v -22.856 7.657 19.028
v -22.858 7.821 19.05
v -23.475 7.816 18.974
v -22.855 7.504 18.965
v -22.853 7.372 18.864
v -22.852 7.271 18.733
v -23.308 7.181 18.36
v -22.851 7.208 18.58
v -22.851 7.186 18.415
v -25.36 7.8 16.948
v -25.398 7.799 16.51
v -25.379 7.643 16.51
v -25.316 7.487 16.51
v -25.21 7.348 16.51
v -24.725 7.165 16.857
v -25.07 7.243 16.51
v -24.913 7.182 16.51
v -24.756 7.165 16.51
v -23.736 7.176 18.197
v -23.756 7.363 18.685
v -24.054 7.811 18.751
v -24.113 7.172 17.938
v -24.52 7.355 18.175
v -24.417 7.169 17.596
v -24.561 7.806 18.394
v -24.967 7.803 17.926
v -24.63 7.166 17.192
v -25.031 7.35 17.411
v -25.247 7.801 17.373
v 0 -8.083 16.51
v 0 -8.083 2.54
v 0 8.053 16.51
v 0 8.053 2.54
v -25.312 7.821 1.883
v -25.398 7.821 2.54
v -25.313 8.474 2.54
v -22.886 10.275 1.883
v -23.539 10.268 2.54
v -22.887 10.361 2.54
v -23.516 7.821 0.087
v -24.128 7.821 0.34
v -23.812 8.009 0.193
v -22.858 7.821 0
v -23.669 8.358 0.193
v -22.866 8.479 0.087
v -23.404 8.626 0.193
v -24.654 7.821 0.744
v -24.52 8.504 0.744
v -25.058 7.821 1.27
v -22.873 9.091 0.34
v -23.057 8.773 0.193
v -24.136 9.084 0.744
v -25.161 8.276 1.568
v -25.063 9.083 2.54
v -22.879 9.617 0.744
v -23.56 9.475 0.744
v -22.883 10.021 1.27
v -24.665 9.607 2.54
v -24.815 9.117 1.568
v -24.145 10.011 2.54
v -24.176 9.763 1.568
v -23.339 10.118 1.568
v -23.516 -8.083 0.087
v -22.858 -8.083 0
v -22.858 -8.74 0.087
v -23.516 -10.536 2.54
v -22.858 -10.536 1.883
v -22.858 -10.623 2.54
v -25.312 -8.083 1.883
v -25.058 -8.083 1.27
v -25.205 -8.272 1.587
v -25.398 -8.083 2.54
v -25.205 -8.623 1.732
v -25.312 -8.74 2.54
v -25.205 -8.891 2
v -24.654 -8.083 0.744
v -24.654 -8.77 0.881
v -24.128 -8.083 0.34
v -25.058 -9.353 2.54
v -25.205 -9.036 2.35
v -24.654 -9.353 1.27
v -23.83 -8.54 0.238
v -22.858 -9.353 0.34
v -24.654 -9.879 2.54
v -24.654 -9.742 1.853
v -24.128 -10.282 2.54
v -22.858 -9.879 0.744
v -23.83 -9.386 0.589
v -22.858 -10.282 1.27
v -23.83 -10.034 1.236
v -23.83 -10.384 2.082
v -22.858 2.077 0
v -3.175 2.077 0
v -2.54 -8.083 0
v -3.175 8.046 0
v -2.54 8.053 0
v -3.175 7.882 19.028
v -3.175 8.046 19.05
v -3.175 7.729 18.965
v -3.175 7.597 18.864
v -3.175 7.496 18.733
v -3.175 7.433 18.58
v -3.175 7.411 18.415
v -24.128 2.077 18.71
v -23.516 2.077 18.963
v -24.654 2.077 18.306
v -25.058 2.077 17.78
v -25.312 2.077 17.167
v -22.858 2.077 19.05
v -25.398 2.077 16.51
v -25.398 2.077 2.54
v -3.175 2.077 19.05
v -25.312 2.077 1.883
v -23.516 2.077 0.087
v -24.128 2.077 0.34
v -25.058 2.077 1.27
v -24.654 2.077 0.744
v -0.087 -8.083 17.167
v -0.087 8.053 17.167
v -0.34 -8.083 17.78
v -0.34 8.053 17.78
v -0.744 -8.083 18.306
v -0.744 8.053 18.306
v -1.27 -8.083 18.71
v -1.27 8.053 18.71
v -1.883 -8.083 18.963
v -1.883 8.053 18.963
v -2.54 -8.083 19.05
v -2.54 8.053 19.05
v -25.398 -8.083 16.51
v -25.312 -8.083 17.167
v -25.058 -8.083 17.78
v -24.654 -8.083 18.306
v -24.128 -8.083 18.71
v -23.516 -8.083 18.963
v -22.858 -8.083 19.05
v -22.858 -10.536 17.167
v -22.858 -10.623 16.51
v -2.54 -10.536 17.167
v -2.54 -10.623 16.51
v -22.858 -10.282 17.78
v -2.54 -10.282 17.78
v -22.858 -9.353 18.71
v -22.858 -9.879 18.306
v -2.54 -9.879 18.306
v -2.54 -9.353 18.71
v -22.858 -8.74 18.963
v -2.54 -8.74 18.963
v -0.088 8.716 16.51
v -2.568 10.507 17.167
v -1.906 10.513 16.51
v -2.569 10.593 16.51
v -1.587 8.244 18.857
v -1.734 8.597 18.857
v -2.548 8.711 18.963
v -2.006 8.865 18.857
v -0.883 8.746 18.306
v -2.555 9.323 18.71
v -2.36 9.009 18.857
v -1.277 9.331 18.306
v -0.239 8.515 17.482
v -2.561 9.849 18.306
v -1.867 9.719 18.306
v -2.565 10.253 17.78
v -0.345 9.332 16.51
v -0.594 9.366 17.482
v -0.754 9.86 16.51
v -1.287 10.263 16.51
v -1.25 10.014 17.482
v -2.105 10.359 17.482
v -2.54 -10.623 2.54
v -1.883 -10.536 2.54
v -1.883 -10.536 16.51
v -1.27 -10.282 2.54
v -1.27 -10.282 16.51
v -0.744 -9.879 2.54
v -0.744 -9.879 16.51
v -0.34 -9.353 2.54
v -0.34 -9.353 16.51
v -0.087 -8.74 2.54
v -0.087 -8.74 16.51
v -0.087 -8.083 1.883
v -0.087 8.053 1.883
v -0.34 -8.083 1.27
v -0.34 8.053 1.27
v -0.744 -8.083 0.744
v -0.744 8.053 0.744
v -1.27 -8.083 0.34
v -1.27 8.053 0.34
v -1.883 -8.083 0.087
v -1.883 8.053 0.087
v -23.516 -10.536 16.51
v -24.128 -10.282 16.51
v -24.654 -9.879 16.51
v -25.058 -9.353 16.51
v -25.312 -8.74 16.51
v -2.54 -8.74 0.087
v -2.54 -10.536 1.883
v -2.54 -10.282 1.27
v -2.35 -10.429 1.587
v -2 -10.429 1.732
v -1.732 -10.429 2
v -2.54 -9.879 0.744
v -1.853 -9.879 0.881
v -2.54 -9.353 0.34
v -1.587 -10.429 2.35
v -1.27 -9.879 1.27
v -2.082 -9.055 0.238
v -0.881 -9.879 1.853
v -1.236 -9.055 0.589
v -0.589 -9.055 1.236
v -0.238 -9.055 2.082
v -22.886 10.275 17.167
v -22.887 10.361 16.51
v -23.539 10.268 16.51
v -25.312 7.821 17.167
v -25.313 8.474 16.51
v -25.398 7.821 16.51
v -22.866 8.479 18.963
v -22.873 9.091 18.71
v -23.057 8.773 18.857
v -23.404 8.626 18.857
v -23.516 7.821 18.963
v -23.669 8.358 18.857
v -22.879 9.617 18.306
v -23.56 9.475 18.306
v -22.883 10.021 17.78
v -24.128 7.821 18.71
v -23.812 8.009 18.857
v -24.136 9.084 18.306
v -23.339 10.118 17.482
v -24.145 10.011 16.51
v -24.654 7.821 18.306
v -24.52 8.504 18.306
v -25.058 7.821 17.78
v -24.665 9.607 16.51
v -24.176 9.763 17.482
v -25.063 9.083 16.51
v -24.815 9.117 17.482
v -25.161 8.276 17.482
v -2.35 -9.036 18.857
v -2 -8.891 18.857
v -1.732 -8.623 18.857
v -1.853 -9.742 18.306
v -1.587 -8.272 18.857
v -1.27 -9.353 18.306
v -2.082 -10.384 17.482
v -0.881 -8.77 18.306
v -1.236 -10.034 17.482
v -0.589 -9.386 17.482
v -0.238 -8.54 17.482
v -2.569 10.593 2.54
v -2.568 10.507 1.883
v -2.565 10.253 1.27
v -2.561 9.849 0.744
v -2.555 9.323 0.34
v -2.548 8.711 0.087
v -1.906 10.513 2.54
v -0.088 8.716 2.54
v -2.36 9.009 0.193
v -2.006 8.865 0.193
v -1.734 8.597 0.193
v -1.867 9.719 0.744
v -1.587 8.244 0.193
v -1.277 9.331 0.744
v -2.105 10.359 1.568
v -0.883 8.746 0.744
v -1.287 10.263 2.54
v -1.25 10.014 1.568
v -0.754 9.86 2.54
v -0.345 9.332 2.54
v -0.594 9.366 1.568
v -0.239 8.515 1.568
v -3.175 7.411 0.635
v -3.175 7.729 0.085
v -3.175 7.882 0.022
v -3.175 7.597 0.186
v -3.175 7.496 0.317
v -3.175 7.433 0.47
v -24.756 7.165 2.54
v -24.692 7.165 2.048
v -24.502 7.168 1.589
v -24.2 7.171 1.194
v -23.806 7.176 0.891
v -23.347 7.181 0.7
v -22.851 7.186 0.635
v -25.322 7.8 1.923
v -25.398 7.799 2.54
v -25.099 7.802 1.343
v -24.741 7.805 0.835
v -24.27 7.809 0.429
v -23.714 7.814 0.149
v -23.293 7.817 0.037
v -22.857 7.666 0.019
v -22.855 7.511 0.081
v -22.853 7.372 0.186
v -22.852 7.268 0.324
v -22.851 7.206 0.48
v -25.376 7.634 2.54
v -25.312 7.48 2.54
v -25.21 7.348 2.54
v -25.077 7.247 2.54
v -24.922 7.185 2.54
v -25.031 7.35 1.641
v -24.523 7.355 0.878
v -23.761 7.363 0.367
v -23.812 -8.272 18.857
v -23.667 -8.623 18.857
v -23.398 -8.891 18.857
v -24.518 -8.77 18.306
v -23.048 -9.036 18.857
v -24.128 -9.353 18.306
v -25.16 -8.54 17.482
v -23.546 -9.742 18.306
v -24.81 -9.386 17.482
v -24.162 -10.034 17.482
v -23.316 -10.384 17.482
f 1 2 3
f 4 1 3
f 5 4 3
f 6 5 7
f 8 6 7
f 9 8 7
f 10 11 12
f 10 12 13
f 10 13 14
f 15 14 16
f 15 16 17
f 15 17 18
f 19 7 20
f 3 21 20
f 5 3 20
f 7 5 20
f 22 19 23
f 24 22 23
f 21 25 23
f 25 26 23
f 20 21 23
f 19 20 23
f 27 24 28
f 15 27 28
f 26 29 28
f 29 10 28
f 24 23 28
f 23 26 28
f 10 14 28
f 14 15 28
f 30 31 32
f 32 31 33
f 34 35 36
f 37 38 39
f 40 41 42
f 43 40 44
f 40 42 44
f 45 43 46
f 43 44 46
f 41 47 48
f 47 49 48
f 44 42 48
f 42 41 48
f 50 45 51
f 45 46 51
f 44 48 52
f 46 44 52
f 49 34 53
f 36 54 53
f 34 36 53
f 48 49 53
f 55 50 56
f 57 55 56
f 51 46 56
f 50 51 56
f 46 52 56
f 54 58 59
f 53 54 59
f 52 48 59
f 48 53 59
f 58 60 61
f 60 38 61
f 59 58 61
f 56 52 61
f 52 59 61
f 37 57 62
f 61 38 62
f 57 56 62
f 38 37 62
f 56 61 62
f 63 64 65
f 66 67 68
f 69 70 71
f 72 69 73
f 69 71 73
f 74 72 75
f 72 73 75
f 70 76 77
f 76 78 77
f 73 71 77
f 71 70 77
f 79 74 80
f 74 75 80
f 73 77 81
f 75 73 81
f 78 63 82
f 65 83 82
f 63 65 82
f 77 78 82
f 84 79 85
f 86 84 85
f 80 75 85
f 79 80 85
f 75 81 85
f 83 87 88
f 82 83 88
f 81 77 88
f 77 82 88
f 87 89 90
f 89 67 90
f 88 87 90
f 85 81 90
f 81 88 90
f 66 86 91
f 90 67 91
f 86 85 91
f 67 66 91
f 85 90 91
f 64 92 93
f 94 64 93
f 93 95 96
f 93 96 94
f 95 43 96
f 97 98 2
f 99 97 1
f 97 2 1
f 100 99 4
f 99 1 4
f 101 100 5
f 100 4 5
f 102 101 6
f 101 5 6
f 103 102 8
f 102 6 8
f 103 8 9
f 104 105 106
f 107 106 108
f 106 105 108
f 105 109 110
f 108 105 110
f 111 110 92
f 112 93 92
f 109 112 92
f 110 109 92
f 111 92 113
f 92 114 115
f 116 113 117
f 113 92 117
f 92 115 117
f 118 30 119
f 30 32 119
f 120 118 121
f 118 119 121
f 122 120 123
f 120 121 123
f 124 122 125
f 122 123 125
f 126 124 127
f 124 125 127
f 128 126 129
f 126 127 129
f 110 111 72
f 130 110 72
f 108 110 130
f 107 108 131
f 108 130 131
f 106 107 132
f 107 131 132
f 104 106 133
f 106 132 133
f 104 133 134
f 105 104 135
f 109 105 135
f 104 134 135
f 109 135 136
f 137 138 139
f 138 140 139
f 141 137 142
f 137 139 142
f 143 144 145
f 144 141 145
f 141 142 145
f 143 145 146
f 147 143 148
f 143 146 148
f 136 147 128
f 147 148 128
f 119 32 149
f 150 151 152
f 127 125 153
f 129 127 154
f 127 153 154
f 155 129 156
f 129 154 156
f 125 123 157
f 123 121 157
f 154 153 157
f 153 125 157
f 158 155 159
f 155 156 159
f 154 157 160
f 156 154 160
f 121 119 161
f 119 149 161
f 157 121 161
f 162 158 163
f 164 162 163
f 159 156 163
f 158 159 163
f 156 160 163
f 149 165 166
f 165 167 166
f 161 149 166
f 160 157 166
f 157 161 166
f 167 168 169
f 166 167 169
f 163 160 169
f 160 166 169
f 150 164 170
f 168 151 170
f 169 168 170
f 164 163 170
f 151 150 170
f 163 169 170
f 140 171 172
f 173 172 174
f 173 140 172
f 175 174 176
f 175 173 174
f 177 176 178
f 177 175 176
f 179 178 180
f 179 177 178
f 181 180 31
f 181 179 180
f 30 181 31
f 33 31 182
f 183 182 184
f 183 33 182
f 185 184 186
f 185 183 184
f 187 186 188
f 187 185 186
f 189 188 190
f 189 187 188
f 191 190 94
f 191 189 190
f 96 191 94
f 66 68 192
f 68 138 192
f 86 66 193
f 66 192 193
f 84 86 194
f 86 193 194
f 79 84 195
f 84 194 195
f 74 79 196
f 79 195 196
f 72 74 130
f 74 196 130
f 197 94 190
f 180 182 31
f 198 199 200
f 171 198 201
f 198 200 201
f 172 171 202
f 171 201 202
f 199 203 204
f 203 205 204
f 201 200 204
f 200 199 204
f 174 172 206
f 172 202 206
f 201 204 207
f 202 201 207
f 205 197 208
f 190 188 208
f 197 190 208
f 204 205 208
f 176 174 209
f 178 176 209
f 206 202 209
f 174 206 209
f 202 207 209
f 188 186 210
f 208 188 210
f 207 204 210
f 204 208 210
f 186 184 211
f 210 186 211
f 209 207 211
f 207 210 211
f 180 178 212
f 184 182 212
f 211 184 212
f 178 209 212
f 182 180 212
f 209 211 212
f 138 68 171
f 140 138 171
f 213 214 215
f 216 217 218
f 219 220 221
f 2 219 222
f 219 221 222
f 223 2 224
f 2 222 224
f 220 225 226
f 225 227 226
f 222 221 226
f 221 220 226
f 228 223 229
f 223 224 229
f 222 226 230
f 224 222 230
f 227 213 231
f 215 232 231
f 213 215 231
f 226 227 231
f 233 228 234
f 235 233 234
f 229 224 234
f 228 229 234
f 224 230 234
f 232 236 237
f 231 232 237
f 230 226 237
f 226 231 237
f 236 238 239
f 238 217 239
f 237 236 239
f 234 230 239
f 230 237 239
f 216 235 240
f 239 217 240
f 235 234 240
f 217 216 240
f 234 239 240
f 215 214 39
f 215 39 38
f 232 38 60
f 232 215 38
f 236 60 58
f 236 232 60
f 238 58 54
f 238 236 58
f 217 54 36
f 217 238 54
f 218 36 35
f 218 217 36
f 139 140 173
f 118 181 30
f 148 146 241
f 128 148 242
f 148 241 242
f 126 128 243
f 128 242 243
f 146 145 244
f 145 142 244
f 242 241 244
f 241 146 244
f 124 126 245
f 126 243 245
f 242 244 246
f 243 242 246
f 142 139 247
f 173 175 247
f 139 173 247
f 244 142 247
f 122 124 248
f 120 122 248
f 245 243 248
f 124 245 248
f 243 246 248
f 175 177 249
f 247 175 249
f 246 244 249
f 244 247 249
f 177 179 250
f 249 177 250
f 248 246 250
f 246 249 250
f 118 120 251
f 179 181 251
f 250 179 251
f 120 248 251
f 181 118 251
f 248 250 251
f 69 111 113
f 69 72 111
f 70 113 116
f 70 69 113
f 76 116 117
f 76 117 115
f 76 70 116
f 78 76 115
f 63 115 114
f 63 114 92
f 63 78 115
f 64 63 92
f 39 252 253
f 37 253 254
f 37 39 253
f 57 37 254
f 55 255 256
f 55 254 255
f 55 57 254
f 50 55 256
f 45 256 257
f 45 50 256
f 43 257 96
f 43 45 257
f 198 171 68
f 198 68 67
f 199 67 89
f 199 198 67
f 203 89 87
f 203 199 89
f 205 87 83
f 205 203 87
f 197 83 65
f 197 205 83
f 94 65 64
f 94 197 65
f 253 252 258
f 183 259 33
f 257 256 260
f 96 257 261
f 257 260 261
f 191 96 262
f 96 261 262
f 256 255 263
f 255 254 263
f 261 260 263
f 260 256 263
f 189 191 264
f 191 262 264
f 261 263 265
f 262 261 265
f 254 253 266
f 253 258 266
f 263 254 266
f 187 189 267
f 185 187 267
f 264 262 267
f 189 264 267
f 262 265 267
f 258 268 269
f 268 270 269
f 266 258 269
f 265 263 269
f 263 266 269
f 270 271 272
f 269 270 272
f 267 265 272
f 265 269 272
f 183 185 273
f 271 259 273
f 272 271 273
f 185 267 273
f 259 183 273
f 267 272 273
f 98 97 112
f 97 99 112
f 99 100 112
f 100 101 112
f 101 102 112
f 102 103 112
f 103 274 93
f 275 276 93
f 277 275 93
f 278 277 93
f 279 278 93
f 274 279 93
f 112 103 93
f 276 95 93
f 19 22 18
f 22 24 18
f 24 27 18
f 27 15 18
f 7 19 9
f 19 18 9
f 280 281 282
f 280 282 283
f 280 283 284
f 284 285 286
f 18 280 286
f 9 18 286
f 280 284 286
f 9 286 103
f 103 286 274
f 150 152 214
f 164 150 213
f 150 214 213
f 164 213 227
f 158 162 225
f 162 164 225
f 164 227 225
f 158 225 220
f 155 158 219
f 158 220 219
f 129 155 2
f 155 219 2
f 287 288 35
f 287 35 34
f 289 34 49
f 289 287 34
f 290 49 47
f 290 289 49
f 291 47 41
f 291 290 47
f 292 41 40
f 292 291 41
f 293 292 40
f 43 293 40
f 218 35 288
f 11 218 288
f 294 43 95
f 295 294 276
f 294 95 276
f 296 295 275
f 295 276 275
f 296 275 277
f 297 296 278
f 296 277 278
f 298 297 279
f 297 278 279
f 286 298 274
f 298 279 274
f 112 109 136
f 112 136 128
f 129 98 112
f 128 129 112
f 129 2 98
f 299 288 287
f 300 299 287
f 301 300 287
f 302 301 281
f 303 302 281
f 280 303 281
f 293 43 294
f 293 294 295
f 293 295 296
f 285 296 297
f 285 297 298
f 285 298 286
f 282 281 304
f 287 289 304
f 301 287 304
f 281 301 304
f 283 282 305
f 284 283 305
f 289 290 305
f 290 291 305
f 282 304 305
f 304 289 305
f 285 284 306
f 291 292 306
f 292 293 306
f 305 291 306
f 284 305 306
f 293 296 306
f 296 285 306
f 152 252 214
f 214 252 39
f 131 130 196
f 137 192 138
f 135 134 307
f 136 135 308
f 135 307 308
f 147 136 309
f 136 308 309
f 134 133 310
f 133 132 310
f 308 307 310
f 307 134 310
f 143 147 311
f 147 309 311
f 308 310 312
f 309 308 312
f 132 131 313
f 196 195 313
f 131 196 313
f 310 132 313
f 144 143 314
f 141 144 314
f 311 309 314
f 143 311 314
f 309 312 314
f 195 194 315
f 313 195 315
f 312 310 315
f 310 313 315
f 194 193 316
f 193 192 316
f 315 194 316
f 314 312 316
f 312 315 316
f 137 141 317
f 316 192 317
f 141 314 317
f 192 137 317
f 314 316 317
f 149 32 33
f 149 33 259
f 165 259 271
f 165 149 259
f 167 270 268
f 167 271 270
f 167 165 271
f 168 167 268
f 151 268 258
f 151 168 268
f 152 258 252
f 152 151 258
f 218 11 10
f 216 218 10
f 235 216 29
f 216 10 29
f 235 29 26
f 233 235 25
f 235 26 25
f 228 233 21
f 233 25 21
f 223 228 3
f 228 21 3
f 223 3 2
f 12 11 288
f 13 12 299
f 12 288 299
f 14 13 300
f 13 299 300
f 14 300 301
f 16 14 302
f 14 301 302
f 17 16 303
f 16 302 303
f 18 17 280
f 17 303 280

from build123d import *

# Parameters (mm, degrees)
BOSS_EXTRUDE1_DEPTH = 19.05
FILLET1_R           = 2.54
FILLET2_R           = 0.635


with BuildPart() as part:
    # Sketch1 → Boss-Extrude1 (new body)
    with BuildSketch(Plane.XY):
        Polygon((-25.398341139, -10.622644211), (0, -10.622644211), (0, 10.622644211), (-25.398341139, 10.332355789), (-25.398341139, 7.157355789), (-3.175, 7.411355789), (-3.175, 7.157355789), (-3.175, 2.077355789), (-25.398341139, 2.077355789), align=None)
    extrude(amount=BOSS_EXTRUDE1_DEPTH)

    # Fillet1
    fillet1_edges = [part.edges().sort_by_distance(p)[0] for p in [
        (-12.69917057, 10.4775, 0),
        (0, 0, 0),
        (-12.69917057, -10.622644211, 0),
        (-25.398341139, -4.272644211, 0),
        (-25.398341139, 10.332355789, 9.525),
        (0, 10.622644211, 9.525),
        (0, -10.622644211, 9.525),
        (-25.398341139, -10.622644211, 9.525),
        (-25.398341139, -4.272644211, 19.05),
        (-12.69917057, -10.622644211, 19.05),
        (0, 0, 19.05),
        (-12.69917057, 10.4775, 19.05),
        (-25.398341139, 8.744855789, 19.05),
        (-25.398341139, 8.744855789, 0),
    ]]
    fillet(fillet1_edges, radius=FILLET1_R)

    # Fillet2
    fillet2_edges = [part.edges().sort_by_distance(p)[0] for p in [
        (-13.01667057, 7.298871158, 0),
        (-25.398341139, 7.157355789, 9.525),
        (-24.654392364, 7.165858695, 18.306051224),
        (-24.654392364, 7.165858695, 0.743948776),
        (-13.01667057, 7.298871158, 19.05),
    ]]
    fillet(fillet2_edges, radius=FILLET2_R - 0.0004)  # a hair under: the kernel refuses the full size


solid = part.part
